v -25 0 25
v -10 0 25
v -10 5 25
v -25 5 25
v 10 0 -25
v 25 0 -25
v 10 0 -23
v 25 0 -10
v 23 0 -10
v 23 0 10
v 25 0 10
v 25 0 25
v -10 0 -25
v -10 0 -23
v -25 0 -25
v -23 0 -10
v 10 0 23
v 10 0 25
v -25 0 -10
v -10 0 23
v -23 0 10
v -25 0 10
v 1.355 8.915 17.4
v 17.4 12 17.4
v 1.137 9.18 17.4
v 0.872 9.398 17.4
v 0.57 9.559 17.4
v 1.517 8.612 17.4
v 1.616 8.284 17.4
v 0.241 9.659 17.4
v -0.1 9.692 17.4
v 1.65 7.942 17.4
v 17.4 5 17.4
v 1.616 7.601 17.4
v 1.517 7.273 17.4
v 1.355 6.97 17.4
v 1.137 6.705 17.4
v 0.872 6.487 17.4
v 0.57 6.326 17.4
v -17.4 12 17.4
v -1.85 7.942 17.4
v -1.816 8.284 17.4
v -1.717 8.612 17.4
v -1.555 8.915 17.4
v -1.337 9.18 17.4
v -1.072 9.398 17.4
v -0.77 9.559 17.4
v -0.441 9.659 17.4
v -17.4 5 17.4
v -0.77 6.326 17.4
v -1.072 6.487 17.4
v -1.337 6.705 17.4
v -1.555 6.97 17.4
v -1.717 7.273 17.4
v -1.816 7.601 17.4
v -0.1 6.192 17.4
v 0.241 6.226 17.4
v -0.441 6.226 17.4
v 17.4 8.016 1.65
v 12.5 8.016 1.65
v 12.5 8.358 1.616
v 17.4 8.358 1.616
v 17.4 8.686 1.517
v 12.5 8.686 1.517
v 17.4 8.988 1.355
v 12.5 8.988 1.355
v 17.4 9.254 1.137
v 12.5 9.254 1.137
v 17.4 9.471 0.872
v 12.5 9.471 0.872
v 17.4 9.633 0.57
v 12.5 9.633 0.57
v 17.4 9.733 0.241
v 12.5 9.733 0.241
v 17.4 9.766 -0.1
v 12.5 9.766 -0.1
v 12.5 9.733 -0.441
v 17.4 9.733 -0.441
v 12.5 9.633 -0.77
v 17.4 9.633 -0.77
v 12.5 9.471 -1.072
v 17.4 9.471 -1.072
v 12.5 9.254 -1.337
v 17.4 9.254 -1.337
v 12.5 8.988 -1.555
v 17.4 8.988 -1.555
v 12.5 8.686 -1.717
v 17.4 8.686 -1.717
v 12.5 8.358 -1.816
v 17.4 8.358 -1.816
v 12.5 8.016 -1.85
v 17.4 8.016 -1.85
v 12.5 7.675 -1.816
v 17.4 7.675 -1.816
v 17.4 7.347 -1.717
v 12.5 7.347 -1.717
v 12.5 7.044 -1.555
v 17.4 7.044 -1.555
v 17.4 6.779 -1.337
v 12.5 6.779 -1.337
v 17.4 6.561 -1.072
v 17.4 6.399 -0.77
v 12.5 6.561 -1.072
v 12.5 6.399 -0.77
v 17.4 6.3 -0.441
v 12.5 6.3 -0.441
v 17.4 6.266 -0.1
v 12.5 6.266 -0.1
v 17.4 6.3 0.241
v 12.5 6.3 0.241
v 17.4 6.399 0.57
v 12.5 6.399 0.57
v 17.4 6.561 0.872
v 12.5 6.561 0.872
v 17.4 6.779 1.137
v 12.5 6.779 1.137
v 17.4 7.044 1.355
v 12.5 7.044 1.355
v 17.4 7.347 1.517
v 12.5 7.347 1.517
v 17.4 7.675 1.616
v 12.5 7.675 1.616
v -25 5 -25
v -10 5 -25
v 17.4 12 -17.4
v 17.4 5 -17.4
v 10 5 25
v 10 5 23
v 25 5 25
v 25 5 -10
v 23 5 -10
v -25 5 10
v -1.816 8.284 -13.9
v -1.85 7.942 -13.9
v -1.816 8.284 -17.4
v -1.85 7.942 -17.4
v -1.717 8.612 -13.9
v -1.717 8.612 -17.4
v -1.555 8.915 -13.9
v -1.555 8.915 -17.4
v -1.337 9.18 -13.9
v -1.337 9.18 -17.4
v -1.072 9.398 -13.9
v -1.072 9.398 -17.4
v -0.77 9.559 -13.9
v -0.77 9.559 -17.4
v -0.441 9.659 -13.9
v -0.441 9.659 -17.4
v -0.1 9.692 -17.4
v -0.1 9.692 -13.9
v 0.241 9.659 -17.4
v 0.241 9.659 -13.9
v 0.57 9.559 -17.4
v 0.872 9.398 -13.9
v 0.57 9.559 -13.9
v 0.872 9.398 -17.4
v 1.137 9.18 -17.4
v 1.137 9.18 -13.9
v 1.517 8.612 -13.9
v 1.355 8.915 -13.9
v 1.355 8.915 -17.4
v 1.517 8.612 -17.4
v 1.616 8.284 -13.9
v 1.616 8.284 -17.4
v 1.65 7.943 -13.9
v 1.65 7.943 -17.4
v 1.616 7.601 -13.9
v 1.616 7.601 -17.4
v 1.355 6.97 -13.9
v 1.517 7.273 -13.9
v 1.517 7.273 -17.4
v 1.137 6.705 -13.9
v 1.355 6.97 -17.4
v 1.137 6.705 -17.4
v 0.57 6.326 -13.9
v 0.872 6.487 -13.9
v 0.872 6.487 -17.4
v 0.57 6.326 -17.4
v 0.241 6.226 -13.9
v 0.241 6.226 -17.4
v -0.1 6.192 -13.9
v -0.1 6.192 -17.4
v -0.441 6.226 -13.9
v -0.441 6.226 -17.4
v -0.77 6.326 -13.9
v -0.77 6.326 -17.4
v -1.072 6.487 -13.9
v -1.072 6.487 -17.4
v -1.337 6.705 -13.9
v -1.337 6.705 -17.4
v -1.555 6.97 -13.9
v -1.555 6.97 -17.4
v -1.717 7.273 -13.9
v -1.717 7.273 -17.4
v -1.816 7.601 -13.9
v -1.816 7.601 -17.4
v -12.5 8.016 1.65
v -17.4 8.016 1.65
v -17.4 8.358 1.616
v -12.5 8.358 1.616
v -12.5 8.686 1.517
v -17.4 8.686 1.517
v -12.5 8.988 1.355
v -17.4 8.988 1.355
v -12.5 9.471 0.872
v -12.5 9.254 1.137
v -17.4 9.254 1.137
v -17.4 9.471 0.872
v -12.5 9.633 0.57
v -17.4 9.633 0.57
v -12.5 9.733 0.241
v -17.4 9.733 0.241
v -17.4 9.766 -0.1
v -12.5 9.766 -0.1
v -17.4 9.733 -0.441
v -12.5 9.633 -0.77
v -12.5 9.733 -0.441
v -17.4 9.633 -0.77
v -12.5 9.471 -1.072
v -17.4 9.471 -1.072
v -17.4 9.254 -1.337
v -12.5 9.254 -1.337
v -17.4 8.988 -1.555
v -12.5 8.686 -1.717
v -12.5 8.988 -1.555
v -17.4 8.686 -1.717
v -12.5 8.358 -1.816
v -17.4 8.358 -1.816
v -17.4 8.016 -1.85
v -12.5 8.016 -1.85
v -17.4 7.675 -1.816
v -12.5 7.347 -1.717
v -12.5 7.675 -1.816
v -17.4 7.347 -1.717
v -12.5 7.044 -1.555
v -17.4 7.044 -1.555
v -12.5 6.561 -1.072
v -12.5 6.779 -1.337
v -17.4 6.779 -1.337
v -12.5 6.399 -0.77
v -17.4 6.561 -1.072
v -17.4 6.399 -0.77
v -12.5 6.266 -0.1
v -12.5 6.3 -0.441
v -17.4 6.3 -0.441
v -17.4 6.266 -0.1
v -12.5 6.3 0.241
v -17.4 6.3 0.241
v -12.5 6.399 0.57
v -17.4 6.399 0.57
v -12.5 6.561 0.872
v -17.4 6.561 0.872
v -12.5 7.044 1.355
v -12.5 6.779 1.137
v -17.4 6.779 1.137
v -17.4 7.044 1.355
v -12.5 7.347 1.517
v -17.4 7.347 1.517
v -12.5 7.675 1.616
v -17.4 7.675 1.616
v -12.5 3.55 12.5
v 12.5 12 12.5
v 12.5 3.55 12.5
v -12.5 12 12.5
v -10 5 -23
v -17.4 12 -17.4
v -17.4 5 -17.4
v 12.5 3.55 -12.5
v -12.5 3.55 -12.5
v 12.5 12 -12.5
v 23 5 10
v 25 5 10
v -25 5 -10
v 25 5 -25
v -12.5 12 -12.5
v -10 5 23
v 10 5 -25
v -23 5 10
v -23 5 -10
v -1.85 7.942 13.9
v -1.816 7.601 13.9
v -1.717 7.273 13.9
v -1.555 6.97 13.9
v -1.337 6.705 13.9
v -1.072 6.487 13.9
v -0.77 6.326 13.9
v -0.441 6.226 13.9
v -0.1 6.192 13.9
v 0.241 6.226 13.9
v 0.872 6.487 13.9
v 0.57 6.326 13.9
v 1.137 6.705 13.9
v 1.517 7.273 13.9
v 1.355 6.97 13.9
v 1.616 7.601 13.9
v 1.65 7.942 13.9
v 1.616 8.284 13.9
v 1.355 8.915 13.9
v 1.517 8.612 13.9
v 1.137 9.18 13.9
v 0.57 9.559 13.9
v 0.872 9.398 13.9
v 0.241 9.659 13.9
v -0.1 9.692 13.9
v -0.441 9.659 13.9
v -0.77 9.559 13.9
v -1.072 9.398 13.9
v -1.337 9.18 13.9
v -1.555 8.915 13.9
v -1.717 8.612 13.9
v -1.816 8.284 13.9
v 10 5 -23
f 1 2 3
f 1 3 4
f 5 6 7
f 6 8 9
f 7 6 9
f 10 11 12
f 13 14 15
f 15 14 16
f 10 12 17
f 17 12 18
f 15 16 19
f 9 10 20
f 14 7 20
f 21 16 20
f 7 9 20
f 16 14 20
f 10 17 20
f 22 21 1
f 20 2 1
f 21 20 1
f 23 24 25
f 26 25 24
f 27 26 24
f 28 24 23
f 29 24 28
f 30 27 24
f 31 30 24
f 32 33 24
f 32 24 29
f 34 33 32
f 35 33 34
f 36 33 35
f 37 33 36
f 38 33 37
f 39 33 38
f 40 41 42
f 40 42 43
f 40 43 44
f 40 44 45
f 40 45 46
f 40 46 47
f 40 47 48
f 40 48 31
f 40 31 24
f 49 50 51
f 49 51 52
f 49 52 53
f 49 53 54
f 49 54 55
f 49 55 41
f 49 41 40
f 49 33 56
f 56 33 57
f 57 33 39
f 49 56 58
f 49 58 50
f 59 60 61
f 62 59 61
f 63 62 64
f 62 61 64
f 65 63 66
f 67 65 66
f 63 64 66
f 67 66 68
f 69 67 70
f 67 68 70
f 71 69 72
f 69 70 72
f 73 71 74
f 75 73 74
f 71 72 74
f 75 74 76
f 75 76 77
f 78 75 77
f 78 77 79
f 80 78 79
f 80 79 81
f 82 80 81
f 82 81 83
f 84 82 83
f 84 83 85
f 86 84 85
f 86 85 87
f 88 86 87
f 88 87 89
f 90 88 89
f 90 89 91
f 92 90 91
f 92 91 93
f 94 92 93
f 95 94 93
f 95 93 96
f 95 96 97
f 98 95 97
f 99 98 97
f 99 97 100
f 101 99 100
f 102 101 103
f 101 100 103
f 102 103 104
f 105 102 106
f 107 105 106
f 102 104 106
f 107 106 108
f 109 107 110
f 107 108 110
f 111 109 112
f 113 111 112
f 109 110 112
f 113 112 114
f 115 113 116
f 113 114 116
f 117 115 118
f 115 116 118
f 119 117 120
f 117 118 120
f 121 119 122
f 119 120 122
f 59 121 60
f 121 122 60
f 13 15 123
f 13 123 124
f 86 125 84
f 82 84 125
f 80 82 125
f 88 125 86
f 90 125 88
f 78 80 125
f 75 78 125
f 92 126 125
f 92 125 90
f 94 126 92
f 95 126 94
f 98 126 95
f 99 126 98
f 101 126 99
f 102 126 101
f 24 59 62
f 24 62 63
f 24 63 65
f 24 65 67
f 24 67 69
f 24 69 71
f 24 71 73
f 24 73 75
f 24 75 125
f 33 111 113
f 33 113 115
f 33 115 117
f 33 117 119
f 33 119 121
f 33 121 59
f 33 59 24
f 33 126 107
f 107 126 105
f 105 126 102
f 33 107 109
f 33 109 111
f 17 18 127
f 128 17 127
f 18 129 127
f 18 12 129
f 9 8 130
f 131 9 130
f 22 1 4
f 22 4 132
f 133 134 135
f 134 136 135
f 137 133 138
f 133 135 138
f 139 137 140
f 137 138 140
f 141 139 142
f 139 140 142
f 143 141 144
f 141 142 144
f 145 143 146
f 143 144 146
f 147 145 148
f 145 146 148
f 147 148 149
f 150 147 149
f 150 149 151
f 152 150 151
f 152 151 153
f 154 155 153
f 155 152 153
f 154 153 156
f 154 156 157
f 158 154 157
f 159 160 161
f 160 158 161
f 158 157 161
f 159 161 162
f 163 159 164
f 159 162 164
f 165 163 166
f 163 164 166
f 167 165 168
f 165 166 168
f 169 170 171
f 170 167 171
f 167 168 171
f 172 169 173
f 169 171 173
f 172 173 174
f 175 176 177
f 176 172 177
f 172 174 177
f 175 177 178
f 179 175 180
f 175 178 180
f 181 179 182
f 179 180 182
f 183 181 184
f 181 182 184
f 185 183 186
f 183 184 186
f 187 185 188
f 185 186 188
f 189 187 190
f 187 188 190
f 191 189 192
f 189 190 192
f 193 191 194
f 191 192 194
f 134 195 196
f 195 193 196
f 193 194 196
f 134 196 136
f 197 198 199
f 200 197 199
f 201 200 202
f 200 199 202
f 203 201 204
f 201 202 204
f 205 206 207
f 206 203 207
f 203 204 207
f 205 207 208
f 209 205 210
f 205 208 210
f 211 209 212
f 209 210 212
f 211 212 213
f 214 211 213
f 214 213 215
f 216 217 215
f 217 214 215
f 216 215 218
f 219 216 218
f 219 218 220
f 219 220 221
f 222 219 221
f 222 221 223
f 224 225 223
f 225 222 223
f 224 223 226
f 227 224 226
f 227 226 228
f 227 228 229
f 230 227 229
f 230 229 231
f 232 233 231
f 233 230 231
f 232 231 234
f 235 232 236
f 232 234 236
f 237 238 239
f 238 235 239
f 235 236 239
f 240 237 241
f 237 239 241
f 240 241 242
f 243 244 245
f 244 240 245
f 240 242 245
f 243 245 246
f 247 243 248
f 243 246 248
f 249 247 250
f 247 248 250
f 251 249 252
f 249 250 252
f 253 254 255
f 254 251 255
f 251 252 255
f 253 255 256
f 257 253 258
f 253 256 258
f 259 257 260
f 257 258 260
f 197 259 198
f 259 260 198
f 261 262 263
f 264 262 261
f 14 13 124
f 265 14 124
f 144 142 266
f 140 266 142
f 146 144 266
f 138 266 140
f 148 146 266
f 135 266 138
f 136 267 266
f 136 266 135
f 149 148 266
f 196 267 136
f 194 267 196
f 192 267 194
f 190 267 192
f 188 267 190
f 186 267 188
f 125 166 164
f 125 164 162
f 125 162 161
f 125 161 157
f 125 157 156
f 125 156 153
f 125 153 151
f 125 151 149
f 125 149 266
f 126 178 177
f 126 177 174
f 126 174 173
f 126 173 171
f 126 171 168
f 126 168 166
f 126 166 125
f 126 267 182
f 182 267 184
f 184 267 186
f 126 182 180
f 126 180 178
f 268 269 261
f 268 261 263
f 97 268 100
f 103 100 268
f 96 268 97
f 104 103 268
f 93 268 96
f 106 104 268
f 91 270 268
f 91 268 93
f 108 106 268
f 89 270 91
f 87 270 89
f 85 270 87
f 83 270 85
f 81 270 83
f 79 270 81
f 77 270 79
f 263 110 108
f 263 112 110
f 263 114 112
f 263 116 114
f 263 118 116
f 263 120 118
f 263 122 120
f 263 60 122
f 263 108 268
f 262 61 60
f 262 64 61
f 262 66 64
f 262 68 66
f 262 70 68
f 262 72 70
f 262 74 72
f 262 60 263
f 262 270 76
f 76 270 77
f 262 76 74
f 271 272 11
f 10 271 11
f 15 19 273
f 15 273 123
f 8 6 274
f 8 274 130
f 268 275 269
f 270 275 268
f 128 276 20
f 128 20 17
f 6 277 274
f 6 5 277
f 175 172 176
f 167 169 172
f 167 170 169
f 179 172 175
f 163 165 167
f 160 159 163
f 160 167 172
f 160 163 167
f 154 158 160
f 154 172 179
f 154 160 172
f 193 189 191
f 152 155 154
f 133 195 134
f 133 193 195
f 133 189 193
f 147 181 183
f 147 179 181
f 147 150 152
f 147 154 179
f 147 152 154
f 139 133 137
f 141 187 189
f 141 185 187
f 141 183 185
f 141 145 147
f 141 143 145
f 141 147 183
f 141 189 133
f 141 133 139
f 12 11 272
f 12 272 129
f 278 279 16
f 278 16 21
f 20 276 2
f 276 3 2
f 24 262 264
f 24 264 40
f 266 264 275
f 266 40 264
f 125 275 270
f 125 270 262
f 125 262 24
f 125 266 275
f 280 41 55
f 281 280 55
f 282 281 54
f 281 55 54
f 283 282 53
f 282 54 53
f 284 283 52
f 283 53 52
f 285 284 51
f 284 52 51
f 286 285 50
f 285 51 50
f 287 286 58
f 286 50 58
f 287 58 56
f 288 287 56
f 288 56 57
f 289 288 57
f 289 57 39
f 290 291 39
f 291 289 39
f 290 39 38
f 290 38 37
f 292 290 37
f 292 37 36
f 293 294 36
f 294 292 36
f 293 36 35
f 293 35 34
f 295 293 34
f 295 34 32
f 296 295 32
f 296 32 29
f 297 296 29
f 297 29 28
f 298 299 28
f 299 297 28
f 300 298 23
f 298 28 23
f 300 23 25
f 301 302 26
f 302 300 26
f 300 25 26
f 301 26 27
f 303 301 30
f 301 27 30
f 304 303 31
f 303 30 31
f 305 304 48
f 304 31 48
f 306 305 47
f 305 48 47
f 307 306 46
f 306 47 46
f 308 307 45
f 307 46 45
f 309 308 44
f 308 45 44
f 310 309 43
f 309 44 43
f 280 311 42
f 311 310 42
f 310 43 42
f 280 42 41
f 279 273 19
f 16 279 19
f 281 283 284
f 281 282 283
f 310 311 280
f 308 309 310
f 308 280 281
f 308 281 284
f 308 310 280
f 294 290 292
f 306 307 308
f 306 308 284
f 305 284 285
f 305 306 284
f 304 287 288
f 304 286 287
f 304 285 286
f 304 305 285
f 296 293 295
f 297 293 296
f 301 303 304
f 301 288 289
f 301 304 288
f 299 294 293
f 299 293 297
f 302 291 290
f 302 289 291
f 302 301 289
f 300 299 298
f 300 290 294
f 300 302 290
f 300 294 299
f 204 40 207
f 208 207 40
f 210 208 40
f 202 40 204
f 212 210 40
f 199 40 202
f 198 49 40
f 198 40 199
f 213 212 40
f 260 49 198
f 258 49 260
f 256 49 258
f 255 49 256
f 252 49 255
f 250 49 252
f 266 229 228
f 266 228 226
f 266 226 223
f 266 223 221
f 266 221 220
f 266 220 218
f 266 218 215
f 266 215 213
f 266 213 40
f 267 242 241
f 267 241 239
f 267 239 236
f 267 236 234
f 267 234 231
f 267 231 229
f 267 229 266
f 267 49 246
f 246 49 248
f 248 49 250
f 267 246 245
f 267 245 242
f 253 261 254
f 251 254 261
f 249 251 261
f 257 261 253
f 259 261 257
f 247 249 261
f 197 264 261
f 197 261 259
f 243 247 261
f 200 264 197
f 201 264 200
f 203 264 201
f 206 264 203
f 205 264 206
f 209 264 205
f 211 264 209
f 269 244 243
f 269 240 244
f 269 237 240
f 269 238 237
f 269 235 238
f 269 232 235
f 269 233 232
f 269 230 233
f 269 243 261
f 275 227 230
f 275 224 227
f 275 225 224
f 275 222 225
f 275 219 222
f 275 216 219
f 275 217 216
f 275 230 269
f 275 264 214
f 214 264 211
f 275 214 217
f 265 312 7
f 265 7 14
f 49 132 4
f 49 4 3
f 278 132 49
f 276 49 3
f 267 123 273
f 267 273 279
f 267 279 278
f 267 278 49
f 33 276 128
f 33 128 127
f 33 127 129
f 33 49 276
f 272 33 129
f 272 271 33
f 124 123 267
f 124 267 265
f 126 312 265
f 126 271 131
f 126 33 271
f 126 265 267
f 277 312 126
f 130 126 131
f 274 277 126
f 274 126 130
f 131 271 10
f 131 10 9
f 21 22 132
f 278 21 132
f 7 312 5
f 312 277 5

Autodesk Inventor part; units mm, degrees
ref_plane "YZ Plane" through (0, 0, 0) normal (1, 0, 0) x (0, 1, 0)
ref_plane "XZ Plane" through (0, 0, 0) normal (0, 1, 0) x (-1, 0, 0)
ref_plane "XY Plane" through (0, 0, 0) normal (0, 0, 1) x (1, 0, 0)
sketch "Sketch1" plane through (0, 0, 0) normal (0, 1, 0) x (-1, 0, 0)
  line L0 (-25, 25) -> (25, 25)
  line L1 (25, 25) -> (25, -25)
  line L2 (25, -25) -> (-25, -25)
  line L3 (-25, -25) -> (-25, 25)
  line L4 (-25, 25) -> (25, -25) construction
  line L5 (25, 25) -> (-25, -25) construction
  line L6 (-17.4, 17.4) -> (17.4, 17.4)
  line L7 (17.4, 17.4) -> (17.4, -17.4)
  line L8 (17.4, -17.4) -> (-17.4, -17.4)
  line L9 (-17.4, -17.4) -> (-17.4, 17.4)
  line L10 (-17.4, 17.4) -> (17.4, -17.4) construction
  line L11 (17.4, 17.4) -> (-17.4, -17.4) construction
  point P0 (0, 0)
  dimension "d0" = 50
  dimension "d1" = 50
  dimension "d2" = 34.8
  dimension "d3" = 34.8
extrude "Extrusion1" add sketch "Sketch1" along normal blind 5
extrude "Extrusion2" add sketch "Sketch1" along normal blind 15 contours L6 L7 L8 L9
sketch "Sketch3" plane through (0, 15, 0) normal (0, 1, 0) x (1, 0, 0)
  point P0 (0, 0)
ref_plane "Work Plane6" through (0, 5, 17.4) normal (-1, 0, 0) x (0, 0, 1)
ref_plane "Work Plane7" through (-17.4, 5, 0) normal (0, 0, 1) x (1, 0, 0)
sketch "Sketch6" plane through (0, 0, 0) normal (0, -1, 0) x (1, 0, 0)
  line L0 (-25, 25) -> (25, 25) projected
  line L1 (-5, -25) -> (5, -25)
  line L2 (5, -25) -> (5, 25)
  line L3 (5, 25) -> (-5, 25)
  line L4 (-5, 25) -> (-5, -25)
  line L5 (-5, -25) -> (5, 25) construction
  line L6 (5, -25) -> (-5, 25) construction
  line L7 (25, 25) -> (25, -25) projected
  line L8 (-25, -5) -> (25, -5)
  line L9 (25, -5) -> (25, 5)
  line L10 (25, 5) -> (-25, 5)
  line L11 (-25, 5) -> (-25, -5)
  line L12 (-25, -5) -> (25, 5) construction
  line L13 (25, -5) -> (-25, 5) construction
  point P0 (0, 0)
  point P1 (-5, -5)
  point P2 (5, -5)
  point P3 (5, 5)
  point P4 (-5, 5)
  dimension "d14" = 10
extrude "Extrusion5" add sketch "Sketch6" along normal blind 2 contours L0 L2 L10 L4 | L10 L2 L8 L4 | L4 L8 L11 L10 | L10 L7 L8 L2 | L8 L2 L1 L4
sketch "Sketch7" plane through (-25, 0, 25) normal (-1, 0, 0) x (0, 0, 1)
  line L0 (-20, -2) -> (-30, -2) projected
  line L1 (-7.6, 5) -> (-42.4, 5) projected
  line L2 (-20, -2) -> (-30, -2)
  line L3 (-30, -2) -> (-30, 5)
  line L4 (-30, 5) -> (-20, 5)
  line L5 (-20, 5) -> (-20, -2)
  point P0 (-25, 0)
  dimension "d17" = 10
extrude "Extrusion6" add sketch "Sketch7" along normal blind 2
mirror "Mirror4" about plane through (0, 5, 17.4) normal (-1, 0, 0) of "Extrusion6"
sketch "Sketch8" plane through (25, 5, -25) normal (0, 0, -1) x (-1, 0, 0)
  line L0 (30, -7) -> (20, -7) projected
  line L1 (0, 0) -> (50, 0) projected
  line L2 (20, -7) -> (30, -7)
  line L3 (30, -7) -> (30, 0)
  line L4 (30, 0) -> (20, 0)
  line L5 (20, 0) -> (20, -7)
  point P0 (25, -5)
  dimension "d20" = 10
extrude "Extrusion7" add sketch "Sketch8" along normal blind 2
mirror "Mirror5" about plane through (-17.4, 5, 0) normal (0, 0, 1) of "Extrusion7"
sketch "Sketch9" plane through (0, 0, 0) normal (0, -1, 0) x (1, 0, 0)
  line L0 (-27, 27) -> (27, 27)
  line L1 (27, 27) -> (27, -27)
  line L2 (27, -27) -> (-27, -27)
  line L3 (-27, -27) -> (-27, 27)
  line L4 (-27, 27) -> (27, -27) construction
  line L5 (27, 27) -> (-27, -27) construction
  point P0 (0, 0)
  dimension "d24" = 54
  dimension "d25" = 54
extrude "Extrusion8" cut sketch "Sketch9" along normal blind 6.75
sketch "Sketch10" plane through (0, 15, 0) normal (0, 1, 0) x (1, 0, 0)
  line L0 (12.5, -12.5) -> (-12.5, -12.5)
  line L1 (-12.5, -12.5) -> (-12.5, 12.5)
  line L2 (-12.5, 12.5) -> (12.5, 12.5)
  line L3 (12.5, 12.5) -> (12.5, -12.5)
  line L4 (12.5, -12.5) -> (-12.5, 12.5) construction
  line L5 (-12.5, -12.5) -> (12.5, 12.5) construction
  point P0 (0, 0)
  dimension "d28" = 25
  dimension "d29" = 25
extrude "Extrusion9" cut sketch "Sketch10" against normal blind 11.45
sketch "Sketch11" plane through (-17.4, 5, 17.4) normal (-1, 0, 0) x (0, 0, 1)
  line L0 (-17.5, 0.0162) -> (-17.5, 3.0162)
  circle A0 centre (-17.5, 3.0162) radius 1.75
  point P0 (-17.4, -5)
  dimension "d33" = 3
  dimension "d34" = 3.5
extrude "Extrusion10" cut sketch "Sketch11" against normal through all
sketch "Sketch12" plane through (17.4, 5, -17.4) normal (0, 0, -1) x (-1, 0, 0)
  line L0 (17.5, -0.0575) -> (17.5, 2.9425)
  circle A0 centre (17.5, 2.9425) radius 1.75
  point P0 (17.4, -5)
  dimension "d37" = 3
  dimension "d38" = 3.5
extrude "Extrusion11" cut sketch "Sketch12" against normal blind 3.5
mirror "Mirror6" about plane through (-17.4, 5, 0) normal (0, 0, 1) of "Extrusion11"
sketch "Sketch13" plane through (0, 15, 0) normal (0, 1, 0) x (1, 0, 0)
  line L0 (5, -25) -> (25, -25) projected
  line L1 (-25, 25) -> (25, 25)
  line L2 (25, 25) -> (25, -25)
  line L3 (25, -25) -> (-25, -25)
  line L4 (-25, -25) -> (-25, 25)
  line L5 (-25, 25) -> (25, -25) construction
  line L6 (25, 25) -> (-25, -25) construction
  point P0 (0, 0)
  point P1 (5, -25)
extrude "Extrusion12" cut sketch "Sketch13" against normal blind 3
sketch "Sketch14" plane through (27, 0, -5) normal (1, 0, 0) x (0, 0, -1)
  line L0 (12.4, 5) -> (-22.4, 5) projected
  line L1 (-15, 0) -> (5, 0)
  line L2 (5, 0) -> (5, 5)
  line L3 (5, 5) -> (-15, 5)
  line L4 (-15, 5) -> (-15, 0)
  line L5 (-15, 0) -> (5, 5) construction
  line L6 (5, 0) -> (-15, 5) construction
  point P0 (-5, 0)
  point P1 (-5, 2.5)
  dimension "d43" = 20
extrude "Extrusion13" cut sketch "Sketch14" against normal blind 4
pattern_circular "Circular Pattern1" count 4 over 360 about axis through (0, -10, 0) along (0, 1, 0) of "Extrusion13"
properties part number "Pokrywka"
